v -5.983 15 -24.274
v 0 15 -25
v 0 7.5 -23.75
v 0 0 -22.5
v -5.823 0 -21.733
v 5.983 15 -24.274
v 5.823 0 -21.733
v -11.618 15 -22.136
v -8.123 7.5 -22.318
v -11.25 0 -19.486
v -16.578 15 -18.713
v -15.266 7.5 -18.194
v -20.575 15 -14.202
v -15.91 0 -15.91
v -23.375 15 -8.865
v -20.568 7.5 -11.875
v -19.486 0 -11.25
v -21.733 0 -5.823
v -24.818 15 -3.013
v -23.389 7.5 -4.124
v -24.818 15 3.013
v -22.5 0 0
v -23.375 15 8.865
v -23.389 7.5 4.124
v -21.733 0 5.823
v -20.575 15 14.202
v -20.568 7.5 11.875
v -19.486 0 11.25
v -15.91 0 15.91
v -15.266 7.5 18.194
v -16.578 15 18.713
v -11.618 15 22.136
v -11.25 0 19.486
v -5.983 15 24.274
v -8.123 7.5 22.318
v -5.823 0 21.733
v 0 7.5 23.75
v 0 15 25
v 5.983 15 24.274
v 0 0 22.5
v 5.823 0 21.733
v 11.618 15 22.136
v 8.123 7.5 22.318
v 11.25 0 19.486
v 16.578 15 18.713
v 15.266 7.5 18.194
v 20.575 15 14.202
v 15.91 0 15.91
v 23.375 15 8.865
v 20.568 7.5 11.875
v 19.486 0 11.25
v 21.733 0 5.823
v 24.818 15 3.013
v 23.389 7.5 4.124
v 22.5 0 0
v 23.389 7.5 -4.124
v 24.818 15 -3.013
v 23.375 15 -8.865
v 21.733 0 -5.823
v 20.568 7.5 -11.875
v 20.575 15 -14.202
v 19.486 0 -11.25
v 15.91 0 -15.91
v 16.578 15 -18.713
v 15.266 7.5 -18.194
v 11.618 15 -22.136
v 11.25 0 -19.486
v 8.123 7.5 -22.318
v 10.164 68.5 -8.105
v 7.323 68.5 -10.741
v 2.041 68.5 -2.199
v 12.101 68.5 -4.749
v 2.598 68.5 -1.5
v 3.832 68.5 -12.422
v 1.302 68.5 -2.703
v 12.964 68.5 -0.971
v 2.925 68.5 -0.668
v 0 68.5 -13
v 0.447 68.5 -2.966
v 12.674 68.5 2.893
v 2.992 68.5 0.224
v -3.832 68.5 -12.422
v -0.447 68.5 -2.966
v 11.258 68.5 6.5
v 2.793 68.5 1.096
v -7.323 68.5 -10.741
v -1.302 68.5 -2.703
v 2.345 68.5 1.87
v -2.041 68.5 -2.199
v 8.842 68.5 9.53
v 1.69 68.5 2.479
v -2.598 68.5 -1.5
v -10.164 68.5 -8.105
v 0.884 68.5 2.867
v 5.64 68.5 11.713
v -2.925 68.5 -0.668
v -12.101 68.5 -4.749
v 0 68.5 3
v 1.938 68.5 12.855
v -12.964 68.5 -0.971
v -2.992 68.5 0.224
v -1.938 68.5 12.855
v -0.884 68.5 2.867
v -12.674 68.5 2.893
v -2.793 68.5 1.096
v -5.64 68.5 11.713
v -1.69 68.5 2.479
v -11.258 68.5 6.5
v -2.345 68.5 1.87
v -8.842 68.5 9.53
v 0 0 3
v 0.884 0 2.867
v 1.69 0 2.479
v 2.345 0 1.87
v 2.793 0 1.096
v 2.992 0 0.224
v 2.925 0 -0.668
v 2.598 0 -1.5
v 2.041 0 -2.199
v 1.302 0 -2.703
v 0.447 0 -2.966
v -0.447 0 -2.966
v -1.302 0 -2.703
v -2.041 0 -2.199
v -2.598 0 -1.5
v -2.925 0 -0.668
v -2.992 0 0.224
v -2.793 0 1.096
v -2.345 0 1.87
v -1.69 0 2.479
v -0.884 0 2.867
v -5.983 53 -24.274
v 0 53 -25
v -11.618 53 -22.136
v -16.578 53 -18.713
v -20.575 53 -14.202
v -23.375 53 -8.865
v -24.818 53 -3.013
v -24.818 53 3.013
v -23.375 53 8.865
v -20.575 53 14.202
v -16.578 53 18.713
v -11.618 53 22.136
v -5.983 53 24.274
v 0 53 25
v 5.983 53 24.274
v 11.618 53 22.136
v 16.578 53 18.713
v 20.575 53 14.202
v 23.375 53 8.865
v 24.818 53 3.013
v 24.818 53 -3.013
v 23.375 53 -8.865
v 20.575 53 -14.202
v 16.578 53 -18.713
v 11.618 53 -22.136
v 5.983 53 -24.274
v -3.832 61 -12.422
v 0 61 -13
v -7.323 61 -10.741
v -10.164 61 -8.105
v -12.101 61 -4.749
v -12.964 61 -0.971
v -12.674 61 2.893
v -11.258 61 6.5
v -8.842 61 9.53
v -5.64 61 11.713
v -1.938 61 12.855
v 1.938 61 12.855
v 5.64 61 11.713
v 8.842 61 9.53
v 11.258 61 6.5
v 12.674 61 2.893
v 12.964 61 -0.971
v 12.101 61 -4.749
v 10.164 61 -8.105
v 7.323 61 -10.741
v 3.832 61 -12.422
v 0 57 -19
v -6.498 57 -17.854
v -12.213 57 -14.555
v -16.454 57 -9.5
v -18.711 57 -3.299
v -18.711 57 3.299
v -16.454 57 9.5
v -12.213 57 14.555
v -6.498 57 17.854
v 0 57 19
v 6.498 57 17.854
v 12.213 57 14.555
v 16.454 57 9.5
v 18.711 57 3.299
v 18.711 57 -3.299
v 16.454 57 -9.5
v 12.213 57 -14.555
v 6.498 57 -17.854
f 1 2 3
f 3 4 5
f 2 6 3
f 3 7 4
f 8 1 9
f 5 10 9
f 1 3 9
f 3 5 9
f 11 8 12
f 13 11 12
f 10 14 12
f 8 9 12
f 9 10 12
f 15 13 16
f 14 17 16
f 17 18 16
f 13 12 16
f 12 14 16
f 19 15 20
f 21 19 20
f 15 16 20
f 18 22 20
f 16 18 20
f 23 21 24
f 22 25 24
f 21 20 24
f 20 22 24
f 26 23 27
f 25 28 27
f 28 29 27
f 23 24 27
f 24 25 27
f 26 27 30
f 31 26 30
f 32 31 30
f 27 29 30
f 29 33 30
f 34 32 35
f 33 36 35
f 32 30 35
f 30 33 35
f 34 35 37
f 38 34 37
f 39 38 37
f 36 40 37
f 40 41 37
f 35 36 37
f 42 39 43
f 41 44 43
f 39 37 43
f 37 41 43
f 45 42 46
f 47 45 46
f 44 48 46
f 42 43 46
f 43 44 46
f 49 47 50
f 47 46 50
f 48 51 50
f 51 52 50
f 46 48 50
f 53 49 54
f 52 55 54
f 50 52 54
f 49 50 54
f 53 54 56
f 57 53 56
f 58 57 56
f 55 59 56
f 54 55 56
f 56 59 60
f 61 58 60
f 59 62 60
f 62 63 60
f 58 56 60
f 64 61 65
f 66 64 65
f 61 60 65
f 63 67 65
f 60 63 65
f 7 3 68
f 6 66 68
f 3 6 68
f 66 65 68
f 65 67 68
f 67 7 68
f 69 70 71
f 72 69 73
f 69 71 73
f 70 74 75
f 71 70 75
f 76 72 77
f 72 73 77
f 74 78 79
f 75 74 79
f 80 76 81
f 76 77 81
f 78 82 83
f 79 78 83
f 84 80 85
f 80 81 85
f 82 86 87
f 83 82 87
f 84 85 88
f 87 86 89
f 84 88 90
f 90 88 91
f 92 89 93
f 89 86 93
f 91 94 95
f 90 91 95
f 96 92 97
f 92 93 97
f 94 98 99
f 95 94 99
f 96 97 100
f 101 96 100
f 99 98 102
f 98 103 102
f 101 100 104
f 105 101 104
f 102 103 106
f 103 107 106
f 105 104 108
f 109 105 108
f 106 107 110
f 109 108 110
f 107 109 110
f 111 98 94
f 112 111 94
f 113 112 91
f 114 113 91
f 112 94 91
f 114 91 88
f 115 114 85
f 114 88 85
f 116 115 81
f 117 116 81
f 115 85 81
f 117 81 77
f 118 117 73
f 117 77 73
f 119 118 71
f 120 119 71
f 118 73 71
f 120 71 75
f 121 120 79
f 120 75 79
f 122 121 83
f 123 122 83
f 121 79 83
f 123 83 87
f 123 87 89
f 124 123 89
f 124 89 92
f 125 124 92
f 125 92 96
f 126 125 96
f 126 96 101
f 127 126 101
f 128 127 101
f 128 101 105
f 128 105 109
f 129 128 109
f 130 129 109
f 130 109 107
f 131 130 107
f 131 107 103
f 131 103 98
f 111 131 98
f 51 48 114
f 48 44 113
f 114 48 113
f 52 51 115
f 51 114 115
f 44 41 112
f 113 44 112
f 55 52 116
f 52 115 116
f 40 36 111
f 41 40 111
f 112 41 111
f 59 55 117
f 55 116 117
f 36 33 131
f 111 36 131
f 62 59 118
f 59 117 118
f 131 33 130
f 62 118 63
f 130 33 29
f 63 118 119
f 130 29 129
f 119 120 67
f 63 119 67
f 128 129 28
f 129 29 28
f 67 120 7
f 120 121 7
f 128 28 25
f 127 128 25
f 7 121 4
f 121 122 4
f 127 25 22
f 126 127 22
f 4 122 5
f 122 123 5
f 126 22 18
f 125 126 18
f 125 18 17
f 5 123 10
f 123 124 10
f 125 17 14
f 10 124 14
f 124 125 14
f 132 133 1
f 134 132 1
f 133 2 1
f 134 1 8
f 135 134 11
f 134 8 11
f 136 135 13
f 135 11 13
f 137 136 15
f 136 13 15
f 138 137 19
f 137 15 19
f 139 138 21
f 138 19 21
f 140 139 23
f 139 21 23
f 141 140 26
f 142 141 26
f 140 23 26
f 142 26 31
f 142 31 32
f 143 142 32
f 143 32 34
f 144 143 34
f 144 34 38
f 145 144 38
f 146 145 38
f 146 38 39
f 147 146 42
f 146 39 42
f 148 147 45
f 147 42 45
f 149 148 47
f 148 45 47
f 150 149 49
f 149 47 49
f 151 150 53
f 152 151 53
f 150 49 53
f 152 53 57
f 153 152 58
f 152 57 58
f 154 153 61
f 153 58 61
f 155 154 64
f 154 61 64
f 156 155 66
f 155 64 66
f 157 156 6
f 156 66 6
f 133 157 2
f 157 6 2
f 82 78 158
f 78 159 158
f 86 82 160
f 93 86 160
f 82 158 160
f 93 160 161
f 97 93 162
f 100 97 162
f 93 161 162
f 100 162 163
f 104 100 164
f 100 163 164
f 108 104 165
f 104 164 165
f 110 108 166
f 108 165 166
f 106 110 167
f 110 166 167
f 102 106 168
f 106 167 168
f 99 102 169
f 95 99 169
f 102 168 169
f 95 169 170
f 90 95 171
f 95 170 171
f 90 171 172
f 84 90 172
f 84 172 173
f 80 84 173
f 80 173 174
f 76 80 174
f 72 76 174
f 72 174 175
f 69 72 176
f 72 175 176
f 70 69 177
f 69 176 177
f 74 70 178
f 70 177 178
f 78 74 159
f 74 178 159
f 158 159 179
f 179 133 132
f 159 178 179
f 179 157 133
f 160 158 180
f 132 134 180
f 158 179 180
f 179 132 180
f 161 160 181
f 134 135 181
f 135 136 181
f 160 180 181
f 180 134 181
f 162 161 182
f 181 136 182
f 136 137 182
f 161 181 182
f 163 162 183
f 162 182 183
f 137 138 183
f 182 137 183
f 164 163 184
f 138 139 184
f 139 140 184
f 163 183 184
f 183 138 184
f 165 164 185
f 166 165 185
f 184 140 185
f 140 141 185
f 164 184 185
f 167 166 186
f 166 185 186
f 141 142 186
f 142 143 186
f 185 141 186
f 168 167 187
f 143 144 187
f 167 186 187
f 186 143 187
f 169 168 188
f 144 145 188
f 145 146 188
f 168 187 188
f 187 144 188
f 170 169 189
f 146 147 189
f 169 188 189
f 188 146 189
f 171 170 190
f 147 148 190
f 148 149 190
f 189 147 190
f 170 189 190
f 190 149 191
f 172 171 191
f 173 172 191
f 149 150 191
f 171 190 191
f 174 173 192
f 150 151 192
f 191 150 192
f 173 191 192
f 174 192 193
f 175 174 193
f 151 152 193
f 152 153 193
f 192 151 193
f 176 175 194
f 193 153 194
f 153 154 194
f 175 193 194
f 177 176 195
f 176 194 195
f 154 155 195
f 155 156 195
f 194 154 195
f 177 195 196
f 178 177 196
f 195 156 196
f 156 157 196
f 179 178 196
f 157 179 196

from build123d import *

# Parameters (mm, degrees)
SKETCH2_R          = 3
CUT_EXTRUDE1_DEPTH = 70


with BuildPart() as part:
    # Sketch1 → Revolve1 (revolve)
    with BuildSketch(Plane.XY, mode=Mode.PRIVATE) as revolve1_sk:
        Polygon((22.5, 0), (0, 0), (0, 68.5), (13, 68.5), (13, 61), (25, 53), (25, 15), align=None)
    revolve(revolve1_sk.sketch.rotate(Axis((0, 0, 0), (0, 1, 0)), 90), axis=Axis((0, 0, 0), (0, 1, 0)))

    # Sketch2 → Cut-Extrude1 (cut)
    with BuildSketch(Plane(origin=(0, 68.5, 0), x_dir=(1, 0, 0), z_dir=(0, 1, 0))):
        with Locations(Location((0, 0, 0), (0, 0, 270))):
            Circle(SKETCH2_R)
    extrude(amount=-CUT_EXTRUDE1_DEPTH, mode=Mode.SUBTRACT)


solid = part.part
